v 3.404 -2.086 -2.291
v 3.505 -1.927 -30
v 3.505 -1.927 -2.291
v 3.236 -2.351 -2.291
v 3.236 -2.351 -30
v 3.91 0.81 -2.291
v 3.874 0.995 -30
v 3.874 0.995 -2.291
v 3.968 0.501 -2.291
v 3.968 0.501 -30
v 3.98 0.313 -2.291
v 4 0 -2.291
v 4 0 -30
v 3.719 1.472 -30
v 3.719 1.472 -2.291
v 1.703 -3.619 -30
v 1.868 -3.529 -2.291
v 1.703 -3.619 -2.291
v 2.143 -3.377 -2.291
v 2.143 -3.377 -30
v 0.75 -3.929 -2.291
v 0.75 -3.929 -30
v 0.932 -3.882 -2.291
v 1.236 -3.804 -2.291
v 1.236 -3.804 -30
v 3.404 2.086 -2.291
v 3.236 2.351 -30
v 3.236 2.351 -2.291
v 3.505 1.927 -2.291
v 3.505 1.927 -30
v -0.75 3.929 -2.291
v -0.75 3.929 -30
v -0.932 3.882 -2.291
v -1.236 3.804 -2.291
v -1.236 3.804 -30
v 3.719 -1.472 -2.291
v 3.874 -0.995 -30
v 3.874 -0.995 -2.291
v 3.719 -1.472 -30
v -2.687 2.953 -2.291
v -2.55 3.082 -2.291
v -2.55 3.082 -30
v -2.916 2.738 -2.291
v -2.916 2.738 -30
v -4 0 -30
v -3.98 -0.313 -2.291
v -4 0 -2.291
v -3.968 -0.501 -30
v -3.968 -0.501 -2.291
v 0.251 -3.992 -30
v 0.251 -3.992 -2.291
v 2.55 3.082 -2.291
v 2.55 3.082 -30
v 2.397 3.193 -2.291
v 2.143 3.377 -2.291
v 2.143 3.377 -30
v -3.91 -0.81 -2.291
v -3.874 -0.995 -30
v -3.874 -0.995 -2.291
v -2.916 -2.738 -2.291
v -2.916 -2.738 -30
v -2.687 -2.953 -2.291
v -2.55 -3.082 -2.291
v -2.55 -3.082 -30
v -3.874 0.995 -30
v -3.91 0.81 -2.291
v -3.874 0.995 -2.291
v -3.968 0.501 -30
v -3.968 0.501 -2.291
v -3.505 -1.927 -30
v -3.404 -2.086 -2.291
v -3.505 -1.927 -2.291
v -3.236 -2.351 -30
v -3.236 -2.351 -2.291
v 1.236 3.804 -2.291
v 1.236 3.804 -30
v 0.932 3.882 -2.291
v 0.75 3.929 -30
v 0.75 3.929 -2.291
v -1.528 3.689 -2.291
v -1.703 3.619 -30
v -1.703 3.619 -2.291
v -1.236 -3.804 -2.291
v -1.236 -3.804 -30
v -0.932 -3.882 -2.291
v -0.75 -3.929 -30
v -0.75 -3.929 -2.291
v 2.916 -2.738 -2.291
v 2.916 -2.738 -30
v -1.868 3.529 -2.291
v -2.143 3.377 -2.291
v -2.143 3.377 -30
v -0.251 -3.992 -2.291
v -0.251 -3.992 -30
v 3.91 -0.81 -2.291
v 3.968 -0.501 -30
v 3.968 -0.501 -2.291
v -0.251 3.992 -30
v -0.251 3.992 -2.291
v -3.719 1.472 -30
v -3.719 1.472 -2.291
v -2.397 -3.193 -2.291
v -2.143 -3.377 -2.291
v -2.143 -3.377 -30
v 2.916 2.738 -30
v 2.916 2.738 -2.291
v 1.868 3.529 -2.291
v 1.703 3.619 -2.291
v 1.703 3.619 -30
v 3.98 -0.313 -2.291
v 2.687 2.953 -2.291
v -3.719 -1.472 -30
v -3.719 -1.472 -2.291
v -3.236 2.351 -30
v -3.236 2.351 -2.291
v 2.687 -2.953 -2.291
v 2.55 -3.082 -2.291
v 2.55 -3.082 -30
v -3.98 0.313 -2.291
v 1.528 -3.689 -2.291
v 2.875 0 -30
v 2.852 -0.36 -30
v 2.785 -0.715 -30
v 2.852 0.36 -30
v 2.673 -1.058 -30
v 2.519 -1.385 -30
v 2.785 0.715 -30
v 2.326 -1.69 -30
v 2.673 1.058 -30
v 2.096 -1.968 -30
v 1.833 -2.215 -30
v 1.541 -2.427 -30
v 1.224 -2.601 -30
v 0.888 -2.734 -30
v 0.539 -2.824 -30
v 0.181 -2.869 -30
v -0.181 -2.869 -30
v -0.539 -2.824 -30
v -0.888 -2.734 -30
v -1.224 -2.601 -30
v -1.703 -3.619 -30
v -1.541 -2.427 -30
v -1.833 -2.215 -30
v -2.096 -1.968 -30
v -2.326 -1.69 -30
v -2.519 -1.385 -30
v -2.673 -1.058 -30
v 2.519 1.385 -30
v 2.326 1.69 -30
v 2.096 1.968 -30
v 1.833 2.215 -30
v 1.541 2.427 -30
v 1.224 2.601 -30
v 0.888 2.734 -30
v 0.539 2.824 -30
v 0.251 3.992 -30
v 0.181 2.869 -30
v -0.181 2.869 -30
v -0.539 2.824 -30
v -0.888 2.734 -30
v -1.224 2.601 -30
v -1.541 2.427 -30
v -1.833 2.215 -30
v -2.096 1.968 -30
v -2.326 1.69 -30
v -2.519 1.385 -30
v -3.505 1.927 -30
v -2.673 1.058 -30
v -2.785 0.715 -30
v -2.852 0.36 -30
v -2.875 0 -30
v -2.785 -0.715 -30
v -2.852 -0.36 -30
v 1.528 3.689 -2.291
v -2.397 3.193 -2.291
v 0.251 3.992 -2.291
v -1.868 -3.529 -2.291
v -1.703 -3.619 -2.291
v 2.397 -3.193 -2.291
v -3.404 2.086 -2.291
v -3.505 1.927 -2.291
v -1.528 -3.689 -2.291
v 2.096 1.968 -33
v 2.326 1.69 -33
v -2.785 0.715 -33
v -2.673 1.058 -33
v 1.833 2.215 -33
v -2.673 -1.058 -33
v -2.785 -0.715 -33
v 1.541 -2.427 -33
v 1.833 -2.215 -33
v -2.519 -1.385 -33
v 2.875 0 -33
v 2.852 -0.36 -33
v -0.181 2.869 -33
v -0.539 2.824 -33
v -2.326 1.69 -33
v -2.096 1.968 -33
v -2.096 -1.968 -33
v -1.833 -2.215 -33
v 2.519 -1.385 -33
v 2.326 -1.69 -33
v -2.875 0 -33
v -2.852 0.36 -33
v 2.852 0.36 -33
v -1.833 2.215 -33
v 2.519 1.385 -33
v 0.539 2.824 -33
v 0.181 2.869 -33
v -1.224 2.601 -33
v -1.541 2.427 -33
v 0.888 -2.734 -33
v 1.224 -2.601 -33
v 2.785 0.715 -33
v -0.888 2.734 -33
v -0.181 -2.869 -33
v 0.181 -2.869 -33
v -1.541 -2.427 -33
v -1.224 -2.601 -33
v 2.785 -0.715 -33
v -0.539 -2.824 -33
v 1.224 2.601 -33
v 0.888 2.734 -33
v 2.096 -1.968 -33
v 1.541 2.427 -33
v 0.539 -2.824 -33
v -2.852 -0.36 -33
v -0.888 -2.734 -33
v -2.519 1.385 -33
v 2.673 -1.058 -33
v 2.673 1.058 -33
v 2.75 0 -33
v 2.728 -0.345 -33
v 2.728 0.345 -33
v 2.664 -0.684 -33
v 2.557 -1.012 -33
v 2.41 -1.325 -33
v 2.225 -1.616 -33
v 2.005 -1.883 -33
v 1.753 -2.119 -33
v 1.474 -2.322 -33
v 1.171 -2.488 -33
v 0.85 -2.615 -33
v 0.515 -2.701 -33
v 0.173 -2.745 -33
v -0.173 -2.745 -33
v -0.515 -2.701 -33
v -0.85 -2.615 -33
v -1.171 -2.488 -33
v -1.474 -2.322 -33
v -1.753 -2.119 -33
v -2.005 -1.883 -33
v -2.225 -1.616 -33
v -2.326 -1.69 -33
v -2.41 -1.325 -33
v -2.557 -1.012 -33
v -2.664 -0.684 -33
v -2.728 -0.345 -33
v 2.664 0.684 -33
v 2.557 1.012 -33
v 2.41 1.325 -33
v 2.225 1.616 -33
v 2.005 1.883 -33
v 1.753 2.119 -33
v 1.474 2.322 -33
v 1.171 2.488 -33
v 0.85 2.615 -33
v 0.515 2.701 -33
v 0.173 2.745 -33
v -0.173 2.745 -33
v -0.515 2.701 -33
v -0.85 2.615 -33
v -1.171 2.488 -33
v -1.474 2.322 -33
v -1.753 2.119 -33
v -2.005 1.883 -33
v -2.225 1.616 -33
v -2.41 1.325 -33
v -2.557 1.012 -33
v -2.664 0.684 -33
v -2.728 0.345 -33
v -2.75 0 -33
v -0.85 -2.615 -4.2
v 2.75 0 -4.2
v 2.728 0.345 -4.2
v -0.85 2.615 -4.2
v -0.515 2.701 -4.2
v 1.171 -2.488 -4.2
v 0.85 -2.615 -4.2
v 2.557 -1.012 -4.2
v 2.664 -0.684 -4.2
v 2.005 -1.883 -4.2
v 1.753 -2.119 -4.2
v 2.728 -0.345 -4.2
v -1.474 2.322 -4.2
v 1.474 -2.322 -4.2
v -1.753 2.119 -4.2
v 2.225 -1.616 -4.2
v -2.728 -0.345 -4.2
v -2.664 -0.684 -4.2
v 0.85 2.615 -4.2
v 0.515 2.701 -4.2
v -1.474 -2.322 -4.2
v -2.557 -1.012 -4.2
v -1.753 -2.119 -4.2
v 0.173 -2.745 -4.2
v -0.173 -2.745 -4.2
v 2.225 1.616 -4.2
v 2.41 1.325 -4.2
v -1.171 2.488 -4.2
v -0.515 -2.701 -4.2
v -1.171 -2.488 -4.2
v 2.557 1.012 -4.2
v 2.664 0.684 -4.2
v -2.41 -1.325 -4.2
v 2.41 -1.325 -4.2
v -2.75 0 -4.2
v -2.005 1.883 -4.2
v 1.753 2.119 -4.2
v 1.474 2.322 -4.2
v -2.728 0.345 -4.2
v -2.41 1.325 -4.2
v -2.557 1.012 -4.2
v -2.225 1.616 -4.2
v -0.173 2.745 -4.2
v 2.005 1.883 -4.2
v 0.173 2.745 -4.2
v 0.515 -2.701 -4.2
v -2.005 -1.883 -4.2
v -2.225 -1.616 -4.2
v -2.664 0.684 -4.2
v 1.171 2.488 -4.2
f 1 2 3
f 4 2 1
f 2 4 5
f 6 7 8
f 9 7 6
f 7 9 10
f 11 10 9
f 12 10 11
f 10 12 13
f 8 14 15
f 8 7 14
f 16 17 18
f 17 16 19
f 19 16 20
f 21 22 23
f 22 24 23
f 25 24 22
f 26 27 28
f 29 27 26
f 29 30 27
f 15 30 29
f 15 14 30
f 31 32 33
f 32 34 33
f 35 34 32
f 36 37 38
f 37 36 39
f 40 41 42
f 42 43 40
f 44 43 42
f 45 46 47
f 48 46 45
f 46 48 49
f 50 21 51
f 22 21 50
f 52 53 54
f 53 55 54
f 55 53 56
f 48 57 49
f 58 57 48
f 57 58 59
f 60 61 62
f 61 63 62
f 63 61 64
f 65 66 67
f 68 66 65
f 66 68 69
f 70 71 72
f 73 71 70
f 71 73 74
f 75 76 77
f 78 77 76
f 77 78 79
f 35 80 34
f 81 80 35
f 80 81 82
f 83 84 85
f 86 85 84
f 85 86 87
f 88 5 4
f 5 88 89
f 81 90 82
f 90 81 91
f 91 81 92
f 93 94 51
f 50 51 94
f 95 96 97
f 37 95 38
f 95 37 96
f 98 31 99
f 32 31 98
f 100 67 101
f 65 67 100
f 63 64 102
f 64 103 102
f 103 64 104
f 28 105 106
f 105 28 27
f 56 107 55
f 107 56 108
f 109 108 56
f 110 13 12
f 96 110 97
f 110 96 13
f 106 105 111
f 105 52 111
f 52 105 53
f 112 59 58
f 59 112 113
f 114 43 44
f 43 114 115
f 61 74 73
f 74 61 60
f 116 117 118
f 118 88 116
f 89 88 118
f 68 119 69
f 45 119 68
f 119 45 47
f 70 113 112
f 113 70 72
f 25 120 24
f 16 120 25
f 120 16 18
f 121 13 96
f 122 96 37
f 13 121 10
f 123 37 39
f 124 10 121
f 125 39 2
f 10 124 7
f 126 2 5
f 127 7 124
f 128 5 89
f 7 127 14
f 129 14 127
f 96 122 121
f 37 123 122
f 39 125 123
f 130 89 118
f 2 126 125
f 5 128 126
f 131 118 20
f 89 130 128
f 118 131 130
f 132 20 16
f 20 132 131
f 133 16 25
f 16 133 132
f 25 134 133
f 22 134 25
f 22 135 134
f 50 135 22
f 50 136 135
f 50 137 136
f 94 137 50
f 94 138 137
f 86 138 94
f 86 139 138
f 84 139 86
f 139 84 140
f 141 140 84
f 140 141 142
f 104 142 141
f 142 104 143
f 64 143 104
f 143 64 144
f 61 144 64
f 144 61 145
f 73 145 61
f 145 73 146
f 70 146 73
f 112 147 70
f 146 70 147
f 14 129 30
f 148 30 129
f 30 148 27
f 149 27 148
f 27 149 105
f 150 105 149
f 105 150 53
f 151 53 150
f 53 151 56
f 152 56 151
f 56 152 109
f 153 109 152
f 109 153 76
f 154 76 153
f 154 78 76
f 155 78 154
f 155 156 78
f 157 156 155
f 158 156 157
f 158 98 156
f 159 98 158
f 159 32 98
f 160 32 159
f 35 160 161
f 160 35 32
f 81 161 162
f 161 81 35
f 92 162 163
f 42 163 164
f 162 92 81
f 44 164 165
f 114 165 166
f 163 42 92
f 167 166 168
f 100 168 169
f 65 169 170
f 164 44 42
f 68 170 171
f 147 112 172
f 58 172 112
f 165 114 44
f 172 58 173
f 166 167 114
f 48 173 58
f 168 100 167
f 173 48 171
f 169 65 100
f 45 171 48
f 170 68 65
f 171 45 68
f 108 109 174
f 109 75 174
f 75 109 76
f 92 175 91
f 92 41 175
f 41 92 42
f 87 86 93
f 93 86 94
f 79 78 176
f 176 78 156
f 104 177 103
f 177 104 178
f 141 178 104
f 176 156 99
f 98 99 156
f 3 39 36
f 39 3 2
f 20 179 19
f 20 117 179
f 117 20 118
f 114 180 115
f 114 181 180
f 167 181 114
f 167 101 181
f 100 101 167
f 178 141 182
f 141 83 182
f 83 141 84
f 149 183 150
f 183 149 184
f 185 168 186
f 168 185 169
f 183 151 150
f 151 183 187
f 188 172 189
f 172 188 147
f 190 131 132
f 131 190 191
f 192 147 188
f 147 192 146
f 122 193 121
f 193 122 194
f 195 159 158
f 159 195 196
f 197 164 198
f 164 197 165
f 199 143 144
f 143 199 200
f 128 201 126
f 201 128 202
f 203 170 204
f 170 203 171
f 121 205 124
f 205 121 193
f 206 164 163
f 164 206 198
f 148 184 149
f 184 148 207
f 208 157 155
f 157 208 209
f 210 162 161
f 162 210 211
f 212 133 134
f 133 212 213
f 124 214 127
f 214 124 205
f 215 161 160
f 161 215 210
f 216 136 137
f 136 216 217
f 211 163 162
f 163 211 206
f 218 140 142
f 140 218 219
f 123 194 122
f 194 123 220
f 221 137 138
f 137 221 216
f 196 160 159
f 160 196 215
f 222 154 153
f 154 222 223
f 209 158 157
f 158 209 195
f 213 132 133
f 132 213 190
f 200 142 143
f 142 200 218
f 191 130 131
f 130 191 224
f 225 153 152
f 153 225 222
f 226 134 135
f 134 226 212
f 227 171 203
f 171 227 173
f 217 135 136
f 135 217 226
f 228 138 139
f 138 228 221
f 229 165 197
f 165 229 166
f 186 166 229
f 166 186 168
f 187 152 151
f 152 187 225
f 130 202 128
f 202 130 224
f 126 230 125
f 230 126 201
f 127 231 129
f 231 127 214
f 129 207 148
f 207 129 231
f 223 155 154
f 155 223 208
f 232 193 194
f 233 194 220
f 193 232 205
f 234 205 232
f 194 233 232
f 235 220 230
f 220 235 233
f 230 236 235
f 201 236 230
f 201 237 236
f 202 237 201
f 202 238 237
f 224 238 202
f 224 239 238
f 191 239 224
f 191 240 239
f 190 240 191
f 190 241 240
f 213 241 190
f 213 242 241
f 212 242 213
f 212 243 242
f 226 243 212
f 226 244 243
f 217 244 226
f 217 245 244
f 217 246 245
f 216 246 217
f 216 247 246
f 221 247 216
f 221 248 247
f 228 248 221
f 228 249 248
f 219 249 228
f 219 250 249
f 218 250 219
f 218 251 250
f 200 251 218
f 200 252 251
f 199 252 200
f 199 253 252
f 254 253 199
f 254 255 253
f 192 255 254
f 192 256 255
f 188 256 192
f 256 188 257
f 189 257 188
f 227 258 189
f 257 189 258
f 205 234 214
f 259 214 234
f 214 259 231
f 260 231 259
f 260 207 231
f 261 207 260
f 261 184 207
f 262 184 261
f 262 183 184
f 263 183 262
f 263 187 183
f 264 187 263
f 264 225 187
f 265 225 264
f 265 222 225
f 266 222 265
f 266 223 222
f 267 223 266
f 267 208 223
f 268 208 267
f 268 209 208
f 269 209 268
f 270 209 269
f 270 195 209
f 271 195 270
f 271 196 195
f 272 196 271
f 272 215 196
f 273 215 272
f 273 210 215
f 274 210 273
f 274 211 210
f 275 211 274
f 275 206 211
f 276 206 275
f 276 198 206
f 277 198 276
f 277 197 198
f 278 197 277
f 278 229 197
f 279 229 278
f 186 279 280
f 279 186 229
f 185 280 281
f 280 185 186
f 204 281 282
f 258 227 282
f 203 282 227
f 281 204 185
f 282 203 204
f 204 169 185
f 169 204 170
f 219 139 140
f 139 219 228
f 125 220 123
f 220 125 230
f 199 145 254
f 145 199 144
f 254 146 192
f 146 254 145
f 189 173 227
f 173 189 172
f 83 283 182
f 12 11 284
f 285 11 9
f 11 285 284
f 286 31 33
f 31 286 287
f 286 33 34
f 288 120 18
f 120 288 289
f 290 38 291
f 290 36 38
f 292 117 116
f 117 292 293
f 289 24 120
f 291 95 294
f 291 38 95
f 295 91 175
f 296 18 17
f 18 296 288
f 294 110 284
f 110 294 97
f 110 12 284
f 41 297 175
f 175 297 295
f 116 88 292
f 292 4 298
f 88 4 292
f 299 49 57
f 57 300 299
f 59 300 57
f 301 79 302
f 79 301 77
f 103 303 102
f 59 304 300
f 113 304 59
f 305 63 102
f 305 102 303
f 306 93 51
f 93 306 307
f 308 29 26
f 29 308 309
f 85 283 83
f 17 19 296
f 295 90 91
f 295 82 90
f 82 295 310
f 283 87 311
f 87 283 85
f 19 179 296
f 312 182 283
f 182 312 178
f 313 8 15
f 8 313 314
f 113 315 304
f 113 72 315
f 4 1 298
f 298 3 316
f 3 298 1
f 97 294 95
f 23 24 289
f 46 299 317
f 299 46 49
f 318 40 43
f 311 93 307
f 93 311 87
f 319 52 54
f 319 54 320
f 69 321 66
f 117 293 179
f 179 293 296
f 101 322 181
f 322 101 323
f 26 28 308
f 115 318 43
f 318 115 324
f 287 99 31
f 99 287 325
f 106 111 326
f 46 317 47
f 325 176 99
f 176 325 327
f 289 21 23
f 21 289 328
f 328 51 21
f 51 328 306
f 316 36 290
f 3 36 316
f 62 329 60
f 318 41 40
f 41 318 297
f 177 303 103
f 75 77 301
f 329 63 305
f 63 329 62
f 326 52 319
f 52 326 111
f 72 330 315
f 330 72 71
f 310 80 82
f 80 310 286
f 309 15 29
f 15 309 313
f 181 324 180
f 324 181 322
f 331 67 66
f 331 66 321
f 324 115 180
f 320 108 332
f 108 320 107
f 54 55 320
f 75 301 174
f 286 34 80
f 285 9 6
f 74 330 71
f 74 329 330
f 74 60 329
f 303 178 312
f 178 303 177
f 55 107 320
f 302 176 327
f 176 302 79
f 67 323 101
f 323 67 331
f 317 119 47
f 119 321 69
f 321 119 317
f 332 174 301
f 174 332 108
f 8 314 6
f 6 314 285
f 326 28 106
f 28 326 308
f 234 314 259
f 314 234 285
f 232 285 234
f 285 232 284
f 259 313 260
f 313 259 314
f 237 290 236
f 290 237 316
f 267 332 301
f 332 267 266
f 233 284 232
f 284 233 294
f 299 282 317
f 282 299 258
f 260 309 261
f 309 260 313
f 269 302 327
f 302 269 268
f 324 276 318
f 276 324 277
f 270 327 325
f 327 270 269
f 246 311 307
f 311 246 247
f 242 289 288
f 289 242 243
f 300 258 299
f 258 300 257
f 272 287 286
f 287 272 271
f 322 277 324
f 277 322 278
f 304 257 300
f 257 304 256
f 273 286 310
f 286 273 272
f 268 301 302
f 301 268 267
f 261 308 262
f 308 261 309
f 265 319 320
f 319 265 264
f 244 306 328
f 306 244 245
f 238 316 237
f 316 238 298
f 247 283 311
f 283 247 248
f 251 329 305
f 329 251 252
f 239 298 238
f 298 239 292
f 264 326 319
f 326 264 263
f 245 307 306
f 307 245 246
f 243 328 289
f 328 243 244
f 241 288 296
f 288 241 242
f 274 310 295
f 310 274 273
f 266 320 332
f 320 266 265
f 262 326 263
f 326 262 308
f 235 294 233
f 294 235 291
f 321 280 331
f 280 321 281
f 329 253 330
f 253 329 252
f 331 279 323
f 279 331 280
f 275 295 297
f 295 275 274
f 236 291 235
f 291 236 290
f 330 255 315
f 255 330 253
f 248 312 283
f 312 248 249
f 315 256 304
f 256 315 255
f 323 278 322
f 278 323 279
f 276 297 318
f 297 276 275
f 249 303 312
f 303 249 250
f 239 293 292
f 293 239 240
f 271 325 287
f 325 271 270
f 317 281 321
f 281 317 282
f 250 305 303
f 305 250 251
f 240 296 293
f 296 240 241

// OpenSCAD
$fn = 50;

difference() {
	union() {
		translate(v = [0, 0, -30.0]) {
			cylinder(h = 30, r = 4.0);
		}
		#translate(v = [0, 0, -33.0]) {
			cylinder(h = 33, r = 2.875);
		}
	}
	union() {
		translate(v = [0, 0, 0]) {
			rotate(a = [0, 0, 0]) {
				difference() {
					union() {
						translate(v = [0, 0, -33.0]) {
							cylinder(h = 33, r = 2.25);
						}
						translate(v = [0, 0, -4.2]) {
							cylinder(h = 4.2, r1 = 2.75, r2 = 5.5);
						}
						translate(v = [0, 0, -33.0]) {
							cylinder(h = 33, r = 2.75);
						}
						translate(v = [0, 0, -33.0]) {
							cylinder(h = 33, r = 2.25);
						}
					}
					union();
				}
			}
		}
	}
}
